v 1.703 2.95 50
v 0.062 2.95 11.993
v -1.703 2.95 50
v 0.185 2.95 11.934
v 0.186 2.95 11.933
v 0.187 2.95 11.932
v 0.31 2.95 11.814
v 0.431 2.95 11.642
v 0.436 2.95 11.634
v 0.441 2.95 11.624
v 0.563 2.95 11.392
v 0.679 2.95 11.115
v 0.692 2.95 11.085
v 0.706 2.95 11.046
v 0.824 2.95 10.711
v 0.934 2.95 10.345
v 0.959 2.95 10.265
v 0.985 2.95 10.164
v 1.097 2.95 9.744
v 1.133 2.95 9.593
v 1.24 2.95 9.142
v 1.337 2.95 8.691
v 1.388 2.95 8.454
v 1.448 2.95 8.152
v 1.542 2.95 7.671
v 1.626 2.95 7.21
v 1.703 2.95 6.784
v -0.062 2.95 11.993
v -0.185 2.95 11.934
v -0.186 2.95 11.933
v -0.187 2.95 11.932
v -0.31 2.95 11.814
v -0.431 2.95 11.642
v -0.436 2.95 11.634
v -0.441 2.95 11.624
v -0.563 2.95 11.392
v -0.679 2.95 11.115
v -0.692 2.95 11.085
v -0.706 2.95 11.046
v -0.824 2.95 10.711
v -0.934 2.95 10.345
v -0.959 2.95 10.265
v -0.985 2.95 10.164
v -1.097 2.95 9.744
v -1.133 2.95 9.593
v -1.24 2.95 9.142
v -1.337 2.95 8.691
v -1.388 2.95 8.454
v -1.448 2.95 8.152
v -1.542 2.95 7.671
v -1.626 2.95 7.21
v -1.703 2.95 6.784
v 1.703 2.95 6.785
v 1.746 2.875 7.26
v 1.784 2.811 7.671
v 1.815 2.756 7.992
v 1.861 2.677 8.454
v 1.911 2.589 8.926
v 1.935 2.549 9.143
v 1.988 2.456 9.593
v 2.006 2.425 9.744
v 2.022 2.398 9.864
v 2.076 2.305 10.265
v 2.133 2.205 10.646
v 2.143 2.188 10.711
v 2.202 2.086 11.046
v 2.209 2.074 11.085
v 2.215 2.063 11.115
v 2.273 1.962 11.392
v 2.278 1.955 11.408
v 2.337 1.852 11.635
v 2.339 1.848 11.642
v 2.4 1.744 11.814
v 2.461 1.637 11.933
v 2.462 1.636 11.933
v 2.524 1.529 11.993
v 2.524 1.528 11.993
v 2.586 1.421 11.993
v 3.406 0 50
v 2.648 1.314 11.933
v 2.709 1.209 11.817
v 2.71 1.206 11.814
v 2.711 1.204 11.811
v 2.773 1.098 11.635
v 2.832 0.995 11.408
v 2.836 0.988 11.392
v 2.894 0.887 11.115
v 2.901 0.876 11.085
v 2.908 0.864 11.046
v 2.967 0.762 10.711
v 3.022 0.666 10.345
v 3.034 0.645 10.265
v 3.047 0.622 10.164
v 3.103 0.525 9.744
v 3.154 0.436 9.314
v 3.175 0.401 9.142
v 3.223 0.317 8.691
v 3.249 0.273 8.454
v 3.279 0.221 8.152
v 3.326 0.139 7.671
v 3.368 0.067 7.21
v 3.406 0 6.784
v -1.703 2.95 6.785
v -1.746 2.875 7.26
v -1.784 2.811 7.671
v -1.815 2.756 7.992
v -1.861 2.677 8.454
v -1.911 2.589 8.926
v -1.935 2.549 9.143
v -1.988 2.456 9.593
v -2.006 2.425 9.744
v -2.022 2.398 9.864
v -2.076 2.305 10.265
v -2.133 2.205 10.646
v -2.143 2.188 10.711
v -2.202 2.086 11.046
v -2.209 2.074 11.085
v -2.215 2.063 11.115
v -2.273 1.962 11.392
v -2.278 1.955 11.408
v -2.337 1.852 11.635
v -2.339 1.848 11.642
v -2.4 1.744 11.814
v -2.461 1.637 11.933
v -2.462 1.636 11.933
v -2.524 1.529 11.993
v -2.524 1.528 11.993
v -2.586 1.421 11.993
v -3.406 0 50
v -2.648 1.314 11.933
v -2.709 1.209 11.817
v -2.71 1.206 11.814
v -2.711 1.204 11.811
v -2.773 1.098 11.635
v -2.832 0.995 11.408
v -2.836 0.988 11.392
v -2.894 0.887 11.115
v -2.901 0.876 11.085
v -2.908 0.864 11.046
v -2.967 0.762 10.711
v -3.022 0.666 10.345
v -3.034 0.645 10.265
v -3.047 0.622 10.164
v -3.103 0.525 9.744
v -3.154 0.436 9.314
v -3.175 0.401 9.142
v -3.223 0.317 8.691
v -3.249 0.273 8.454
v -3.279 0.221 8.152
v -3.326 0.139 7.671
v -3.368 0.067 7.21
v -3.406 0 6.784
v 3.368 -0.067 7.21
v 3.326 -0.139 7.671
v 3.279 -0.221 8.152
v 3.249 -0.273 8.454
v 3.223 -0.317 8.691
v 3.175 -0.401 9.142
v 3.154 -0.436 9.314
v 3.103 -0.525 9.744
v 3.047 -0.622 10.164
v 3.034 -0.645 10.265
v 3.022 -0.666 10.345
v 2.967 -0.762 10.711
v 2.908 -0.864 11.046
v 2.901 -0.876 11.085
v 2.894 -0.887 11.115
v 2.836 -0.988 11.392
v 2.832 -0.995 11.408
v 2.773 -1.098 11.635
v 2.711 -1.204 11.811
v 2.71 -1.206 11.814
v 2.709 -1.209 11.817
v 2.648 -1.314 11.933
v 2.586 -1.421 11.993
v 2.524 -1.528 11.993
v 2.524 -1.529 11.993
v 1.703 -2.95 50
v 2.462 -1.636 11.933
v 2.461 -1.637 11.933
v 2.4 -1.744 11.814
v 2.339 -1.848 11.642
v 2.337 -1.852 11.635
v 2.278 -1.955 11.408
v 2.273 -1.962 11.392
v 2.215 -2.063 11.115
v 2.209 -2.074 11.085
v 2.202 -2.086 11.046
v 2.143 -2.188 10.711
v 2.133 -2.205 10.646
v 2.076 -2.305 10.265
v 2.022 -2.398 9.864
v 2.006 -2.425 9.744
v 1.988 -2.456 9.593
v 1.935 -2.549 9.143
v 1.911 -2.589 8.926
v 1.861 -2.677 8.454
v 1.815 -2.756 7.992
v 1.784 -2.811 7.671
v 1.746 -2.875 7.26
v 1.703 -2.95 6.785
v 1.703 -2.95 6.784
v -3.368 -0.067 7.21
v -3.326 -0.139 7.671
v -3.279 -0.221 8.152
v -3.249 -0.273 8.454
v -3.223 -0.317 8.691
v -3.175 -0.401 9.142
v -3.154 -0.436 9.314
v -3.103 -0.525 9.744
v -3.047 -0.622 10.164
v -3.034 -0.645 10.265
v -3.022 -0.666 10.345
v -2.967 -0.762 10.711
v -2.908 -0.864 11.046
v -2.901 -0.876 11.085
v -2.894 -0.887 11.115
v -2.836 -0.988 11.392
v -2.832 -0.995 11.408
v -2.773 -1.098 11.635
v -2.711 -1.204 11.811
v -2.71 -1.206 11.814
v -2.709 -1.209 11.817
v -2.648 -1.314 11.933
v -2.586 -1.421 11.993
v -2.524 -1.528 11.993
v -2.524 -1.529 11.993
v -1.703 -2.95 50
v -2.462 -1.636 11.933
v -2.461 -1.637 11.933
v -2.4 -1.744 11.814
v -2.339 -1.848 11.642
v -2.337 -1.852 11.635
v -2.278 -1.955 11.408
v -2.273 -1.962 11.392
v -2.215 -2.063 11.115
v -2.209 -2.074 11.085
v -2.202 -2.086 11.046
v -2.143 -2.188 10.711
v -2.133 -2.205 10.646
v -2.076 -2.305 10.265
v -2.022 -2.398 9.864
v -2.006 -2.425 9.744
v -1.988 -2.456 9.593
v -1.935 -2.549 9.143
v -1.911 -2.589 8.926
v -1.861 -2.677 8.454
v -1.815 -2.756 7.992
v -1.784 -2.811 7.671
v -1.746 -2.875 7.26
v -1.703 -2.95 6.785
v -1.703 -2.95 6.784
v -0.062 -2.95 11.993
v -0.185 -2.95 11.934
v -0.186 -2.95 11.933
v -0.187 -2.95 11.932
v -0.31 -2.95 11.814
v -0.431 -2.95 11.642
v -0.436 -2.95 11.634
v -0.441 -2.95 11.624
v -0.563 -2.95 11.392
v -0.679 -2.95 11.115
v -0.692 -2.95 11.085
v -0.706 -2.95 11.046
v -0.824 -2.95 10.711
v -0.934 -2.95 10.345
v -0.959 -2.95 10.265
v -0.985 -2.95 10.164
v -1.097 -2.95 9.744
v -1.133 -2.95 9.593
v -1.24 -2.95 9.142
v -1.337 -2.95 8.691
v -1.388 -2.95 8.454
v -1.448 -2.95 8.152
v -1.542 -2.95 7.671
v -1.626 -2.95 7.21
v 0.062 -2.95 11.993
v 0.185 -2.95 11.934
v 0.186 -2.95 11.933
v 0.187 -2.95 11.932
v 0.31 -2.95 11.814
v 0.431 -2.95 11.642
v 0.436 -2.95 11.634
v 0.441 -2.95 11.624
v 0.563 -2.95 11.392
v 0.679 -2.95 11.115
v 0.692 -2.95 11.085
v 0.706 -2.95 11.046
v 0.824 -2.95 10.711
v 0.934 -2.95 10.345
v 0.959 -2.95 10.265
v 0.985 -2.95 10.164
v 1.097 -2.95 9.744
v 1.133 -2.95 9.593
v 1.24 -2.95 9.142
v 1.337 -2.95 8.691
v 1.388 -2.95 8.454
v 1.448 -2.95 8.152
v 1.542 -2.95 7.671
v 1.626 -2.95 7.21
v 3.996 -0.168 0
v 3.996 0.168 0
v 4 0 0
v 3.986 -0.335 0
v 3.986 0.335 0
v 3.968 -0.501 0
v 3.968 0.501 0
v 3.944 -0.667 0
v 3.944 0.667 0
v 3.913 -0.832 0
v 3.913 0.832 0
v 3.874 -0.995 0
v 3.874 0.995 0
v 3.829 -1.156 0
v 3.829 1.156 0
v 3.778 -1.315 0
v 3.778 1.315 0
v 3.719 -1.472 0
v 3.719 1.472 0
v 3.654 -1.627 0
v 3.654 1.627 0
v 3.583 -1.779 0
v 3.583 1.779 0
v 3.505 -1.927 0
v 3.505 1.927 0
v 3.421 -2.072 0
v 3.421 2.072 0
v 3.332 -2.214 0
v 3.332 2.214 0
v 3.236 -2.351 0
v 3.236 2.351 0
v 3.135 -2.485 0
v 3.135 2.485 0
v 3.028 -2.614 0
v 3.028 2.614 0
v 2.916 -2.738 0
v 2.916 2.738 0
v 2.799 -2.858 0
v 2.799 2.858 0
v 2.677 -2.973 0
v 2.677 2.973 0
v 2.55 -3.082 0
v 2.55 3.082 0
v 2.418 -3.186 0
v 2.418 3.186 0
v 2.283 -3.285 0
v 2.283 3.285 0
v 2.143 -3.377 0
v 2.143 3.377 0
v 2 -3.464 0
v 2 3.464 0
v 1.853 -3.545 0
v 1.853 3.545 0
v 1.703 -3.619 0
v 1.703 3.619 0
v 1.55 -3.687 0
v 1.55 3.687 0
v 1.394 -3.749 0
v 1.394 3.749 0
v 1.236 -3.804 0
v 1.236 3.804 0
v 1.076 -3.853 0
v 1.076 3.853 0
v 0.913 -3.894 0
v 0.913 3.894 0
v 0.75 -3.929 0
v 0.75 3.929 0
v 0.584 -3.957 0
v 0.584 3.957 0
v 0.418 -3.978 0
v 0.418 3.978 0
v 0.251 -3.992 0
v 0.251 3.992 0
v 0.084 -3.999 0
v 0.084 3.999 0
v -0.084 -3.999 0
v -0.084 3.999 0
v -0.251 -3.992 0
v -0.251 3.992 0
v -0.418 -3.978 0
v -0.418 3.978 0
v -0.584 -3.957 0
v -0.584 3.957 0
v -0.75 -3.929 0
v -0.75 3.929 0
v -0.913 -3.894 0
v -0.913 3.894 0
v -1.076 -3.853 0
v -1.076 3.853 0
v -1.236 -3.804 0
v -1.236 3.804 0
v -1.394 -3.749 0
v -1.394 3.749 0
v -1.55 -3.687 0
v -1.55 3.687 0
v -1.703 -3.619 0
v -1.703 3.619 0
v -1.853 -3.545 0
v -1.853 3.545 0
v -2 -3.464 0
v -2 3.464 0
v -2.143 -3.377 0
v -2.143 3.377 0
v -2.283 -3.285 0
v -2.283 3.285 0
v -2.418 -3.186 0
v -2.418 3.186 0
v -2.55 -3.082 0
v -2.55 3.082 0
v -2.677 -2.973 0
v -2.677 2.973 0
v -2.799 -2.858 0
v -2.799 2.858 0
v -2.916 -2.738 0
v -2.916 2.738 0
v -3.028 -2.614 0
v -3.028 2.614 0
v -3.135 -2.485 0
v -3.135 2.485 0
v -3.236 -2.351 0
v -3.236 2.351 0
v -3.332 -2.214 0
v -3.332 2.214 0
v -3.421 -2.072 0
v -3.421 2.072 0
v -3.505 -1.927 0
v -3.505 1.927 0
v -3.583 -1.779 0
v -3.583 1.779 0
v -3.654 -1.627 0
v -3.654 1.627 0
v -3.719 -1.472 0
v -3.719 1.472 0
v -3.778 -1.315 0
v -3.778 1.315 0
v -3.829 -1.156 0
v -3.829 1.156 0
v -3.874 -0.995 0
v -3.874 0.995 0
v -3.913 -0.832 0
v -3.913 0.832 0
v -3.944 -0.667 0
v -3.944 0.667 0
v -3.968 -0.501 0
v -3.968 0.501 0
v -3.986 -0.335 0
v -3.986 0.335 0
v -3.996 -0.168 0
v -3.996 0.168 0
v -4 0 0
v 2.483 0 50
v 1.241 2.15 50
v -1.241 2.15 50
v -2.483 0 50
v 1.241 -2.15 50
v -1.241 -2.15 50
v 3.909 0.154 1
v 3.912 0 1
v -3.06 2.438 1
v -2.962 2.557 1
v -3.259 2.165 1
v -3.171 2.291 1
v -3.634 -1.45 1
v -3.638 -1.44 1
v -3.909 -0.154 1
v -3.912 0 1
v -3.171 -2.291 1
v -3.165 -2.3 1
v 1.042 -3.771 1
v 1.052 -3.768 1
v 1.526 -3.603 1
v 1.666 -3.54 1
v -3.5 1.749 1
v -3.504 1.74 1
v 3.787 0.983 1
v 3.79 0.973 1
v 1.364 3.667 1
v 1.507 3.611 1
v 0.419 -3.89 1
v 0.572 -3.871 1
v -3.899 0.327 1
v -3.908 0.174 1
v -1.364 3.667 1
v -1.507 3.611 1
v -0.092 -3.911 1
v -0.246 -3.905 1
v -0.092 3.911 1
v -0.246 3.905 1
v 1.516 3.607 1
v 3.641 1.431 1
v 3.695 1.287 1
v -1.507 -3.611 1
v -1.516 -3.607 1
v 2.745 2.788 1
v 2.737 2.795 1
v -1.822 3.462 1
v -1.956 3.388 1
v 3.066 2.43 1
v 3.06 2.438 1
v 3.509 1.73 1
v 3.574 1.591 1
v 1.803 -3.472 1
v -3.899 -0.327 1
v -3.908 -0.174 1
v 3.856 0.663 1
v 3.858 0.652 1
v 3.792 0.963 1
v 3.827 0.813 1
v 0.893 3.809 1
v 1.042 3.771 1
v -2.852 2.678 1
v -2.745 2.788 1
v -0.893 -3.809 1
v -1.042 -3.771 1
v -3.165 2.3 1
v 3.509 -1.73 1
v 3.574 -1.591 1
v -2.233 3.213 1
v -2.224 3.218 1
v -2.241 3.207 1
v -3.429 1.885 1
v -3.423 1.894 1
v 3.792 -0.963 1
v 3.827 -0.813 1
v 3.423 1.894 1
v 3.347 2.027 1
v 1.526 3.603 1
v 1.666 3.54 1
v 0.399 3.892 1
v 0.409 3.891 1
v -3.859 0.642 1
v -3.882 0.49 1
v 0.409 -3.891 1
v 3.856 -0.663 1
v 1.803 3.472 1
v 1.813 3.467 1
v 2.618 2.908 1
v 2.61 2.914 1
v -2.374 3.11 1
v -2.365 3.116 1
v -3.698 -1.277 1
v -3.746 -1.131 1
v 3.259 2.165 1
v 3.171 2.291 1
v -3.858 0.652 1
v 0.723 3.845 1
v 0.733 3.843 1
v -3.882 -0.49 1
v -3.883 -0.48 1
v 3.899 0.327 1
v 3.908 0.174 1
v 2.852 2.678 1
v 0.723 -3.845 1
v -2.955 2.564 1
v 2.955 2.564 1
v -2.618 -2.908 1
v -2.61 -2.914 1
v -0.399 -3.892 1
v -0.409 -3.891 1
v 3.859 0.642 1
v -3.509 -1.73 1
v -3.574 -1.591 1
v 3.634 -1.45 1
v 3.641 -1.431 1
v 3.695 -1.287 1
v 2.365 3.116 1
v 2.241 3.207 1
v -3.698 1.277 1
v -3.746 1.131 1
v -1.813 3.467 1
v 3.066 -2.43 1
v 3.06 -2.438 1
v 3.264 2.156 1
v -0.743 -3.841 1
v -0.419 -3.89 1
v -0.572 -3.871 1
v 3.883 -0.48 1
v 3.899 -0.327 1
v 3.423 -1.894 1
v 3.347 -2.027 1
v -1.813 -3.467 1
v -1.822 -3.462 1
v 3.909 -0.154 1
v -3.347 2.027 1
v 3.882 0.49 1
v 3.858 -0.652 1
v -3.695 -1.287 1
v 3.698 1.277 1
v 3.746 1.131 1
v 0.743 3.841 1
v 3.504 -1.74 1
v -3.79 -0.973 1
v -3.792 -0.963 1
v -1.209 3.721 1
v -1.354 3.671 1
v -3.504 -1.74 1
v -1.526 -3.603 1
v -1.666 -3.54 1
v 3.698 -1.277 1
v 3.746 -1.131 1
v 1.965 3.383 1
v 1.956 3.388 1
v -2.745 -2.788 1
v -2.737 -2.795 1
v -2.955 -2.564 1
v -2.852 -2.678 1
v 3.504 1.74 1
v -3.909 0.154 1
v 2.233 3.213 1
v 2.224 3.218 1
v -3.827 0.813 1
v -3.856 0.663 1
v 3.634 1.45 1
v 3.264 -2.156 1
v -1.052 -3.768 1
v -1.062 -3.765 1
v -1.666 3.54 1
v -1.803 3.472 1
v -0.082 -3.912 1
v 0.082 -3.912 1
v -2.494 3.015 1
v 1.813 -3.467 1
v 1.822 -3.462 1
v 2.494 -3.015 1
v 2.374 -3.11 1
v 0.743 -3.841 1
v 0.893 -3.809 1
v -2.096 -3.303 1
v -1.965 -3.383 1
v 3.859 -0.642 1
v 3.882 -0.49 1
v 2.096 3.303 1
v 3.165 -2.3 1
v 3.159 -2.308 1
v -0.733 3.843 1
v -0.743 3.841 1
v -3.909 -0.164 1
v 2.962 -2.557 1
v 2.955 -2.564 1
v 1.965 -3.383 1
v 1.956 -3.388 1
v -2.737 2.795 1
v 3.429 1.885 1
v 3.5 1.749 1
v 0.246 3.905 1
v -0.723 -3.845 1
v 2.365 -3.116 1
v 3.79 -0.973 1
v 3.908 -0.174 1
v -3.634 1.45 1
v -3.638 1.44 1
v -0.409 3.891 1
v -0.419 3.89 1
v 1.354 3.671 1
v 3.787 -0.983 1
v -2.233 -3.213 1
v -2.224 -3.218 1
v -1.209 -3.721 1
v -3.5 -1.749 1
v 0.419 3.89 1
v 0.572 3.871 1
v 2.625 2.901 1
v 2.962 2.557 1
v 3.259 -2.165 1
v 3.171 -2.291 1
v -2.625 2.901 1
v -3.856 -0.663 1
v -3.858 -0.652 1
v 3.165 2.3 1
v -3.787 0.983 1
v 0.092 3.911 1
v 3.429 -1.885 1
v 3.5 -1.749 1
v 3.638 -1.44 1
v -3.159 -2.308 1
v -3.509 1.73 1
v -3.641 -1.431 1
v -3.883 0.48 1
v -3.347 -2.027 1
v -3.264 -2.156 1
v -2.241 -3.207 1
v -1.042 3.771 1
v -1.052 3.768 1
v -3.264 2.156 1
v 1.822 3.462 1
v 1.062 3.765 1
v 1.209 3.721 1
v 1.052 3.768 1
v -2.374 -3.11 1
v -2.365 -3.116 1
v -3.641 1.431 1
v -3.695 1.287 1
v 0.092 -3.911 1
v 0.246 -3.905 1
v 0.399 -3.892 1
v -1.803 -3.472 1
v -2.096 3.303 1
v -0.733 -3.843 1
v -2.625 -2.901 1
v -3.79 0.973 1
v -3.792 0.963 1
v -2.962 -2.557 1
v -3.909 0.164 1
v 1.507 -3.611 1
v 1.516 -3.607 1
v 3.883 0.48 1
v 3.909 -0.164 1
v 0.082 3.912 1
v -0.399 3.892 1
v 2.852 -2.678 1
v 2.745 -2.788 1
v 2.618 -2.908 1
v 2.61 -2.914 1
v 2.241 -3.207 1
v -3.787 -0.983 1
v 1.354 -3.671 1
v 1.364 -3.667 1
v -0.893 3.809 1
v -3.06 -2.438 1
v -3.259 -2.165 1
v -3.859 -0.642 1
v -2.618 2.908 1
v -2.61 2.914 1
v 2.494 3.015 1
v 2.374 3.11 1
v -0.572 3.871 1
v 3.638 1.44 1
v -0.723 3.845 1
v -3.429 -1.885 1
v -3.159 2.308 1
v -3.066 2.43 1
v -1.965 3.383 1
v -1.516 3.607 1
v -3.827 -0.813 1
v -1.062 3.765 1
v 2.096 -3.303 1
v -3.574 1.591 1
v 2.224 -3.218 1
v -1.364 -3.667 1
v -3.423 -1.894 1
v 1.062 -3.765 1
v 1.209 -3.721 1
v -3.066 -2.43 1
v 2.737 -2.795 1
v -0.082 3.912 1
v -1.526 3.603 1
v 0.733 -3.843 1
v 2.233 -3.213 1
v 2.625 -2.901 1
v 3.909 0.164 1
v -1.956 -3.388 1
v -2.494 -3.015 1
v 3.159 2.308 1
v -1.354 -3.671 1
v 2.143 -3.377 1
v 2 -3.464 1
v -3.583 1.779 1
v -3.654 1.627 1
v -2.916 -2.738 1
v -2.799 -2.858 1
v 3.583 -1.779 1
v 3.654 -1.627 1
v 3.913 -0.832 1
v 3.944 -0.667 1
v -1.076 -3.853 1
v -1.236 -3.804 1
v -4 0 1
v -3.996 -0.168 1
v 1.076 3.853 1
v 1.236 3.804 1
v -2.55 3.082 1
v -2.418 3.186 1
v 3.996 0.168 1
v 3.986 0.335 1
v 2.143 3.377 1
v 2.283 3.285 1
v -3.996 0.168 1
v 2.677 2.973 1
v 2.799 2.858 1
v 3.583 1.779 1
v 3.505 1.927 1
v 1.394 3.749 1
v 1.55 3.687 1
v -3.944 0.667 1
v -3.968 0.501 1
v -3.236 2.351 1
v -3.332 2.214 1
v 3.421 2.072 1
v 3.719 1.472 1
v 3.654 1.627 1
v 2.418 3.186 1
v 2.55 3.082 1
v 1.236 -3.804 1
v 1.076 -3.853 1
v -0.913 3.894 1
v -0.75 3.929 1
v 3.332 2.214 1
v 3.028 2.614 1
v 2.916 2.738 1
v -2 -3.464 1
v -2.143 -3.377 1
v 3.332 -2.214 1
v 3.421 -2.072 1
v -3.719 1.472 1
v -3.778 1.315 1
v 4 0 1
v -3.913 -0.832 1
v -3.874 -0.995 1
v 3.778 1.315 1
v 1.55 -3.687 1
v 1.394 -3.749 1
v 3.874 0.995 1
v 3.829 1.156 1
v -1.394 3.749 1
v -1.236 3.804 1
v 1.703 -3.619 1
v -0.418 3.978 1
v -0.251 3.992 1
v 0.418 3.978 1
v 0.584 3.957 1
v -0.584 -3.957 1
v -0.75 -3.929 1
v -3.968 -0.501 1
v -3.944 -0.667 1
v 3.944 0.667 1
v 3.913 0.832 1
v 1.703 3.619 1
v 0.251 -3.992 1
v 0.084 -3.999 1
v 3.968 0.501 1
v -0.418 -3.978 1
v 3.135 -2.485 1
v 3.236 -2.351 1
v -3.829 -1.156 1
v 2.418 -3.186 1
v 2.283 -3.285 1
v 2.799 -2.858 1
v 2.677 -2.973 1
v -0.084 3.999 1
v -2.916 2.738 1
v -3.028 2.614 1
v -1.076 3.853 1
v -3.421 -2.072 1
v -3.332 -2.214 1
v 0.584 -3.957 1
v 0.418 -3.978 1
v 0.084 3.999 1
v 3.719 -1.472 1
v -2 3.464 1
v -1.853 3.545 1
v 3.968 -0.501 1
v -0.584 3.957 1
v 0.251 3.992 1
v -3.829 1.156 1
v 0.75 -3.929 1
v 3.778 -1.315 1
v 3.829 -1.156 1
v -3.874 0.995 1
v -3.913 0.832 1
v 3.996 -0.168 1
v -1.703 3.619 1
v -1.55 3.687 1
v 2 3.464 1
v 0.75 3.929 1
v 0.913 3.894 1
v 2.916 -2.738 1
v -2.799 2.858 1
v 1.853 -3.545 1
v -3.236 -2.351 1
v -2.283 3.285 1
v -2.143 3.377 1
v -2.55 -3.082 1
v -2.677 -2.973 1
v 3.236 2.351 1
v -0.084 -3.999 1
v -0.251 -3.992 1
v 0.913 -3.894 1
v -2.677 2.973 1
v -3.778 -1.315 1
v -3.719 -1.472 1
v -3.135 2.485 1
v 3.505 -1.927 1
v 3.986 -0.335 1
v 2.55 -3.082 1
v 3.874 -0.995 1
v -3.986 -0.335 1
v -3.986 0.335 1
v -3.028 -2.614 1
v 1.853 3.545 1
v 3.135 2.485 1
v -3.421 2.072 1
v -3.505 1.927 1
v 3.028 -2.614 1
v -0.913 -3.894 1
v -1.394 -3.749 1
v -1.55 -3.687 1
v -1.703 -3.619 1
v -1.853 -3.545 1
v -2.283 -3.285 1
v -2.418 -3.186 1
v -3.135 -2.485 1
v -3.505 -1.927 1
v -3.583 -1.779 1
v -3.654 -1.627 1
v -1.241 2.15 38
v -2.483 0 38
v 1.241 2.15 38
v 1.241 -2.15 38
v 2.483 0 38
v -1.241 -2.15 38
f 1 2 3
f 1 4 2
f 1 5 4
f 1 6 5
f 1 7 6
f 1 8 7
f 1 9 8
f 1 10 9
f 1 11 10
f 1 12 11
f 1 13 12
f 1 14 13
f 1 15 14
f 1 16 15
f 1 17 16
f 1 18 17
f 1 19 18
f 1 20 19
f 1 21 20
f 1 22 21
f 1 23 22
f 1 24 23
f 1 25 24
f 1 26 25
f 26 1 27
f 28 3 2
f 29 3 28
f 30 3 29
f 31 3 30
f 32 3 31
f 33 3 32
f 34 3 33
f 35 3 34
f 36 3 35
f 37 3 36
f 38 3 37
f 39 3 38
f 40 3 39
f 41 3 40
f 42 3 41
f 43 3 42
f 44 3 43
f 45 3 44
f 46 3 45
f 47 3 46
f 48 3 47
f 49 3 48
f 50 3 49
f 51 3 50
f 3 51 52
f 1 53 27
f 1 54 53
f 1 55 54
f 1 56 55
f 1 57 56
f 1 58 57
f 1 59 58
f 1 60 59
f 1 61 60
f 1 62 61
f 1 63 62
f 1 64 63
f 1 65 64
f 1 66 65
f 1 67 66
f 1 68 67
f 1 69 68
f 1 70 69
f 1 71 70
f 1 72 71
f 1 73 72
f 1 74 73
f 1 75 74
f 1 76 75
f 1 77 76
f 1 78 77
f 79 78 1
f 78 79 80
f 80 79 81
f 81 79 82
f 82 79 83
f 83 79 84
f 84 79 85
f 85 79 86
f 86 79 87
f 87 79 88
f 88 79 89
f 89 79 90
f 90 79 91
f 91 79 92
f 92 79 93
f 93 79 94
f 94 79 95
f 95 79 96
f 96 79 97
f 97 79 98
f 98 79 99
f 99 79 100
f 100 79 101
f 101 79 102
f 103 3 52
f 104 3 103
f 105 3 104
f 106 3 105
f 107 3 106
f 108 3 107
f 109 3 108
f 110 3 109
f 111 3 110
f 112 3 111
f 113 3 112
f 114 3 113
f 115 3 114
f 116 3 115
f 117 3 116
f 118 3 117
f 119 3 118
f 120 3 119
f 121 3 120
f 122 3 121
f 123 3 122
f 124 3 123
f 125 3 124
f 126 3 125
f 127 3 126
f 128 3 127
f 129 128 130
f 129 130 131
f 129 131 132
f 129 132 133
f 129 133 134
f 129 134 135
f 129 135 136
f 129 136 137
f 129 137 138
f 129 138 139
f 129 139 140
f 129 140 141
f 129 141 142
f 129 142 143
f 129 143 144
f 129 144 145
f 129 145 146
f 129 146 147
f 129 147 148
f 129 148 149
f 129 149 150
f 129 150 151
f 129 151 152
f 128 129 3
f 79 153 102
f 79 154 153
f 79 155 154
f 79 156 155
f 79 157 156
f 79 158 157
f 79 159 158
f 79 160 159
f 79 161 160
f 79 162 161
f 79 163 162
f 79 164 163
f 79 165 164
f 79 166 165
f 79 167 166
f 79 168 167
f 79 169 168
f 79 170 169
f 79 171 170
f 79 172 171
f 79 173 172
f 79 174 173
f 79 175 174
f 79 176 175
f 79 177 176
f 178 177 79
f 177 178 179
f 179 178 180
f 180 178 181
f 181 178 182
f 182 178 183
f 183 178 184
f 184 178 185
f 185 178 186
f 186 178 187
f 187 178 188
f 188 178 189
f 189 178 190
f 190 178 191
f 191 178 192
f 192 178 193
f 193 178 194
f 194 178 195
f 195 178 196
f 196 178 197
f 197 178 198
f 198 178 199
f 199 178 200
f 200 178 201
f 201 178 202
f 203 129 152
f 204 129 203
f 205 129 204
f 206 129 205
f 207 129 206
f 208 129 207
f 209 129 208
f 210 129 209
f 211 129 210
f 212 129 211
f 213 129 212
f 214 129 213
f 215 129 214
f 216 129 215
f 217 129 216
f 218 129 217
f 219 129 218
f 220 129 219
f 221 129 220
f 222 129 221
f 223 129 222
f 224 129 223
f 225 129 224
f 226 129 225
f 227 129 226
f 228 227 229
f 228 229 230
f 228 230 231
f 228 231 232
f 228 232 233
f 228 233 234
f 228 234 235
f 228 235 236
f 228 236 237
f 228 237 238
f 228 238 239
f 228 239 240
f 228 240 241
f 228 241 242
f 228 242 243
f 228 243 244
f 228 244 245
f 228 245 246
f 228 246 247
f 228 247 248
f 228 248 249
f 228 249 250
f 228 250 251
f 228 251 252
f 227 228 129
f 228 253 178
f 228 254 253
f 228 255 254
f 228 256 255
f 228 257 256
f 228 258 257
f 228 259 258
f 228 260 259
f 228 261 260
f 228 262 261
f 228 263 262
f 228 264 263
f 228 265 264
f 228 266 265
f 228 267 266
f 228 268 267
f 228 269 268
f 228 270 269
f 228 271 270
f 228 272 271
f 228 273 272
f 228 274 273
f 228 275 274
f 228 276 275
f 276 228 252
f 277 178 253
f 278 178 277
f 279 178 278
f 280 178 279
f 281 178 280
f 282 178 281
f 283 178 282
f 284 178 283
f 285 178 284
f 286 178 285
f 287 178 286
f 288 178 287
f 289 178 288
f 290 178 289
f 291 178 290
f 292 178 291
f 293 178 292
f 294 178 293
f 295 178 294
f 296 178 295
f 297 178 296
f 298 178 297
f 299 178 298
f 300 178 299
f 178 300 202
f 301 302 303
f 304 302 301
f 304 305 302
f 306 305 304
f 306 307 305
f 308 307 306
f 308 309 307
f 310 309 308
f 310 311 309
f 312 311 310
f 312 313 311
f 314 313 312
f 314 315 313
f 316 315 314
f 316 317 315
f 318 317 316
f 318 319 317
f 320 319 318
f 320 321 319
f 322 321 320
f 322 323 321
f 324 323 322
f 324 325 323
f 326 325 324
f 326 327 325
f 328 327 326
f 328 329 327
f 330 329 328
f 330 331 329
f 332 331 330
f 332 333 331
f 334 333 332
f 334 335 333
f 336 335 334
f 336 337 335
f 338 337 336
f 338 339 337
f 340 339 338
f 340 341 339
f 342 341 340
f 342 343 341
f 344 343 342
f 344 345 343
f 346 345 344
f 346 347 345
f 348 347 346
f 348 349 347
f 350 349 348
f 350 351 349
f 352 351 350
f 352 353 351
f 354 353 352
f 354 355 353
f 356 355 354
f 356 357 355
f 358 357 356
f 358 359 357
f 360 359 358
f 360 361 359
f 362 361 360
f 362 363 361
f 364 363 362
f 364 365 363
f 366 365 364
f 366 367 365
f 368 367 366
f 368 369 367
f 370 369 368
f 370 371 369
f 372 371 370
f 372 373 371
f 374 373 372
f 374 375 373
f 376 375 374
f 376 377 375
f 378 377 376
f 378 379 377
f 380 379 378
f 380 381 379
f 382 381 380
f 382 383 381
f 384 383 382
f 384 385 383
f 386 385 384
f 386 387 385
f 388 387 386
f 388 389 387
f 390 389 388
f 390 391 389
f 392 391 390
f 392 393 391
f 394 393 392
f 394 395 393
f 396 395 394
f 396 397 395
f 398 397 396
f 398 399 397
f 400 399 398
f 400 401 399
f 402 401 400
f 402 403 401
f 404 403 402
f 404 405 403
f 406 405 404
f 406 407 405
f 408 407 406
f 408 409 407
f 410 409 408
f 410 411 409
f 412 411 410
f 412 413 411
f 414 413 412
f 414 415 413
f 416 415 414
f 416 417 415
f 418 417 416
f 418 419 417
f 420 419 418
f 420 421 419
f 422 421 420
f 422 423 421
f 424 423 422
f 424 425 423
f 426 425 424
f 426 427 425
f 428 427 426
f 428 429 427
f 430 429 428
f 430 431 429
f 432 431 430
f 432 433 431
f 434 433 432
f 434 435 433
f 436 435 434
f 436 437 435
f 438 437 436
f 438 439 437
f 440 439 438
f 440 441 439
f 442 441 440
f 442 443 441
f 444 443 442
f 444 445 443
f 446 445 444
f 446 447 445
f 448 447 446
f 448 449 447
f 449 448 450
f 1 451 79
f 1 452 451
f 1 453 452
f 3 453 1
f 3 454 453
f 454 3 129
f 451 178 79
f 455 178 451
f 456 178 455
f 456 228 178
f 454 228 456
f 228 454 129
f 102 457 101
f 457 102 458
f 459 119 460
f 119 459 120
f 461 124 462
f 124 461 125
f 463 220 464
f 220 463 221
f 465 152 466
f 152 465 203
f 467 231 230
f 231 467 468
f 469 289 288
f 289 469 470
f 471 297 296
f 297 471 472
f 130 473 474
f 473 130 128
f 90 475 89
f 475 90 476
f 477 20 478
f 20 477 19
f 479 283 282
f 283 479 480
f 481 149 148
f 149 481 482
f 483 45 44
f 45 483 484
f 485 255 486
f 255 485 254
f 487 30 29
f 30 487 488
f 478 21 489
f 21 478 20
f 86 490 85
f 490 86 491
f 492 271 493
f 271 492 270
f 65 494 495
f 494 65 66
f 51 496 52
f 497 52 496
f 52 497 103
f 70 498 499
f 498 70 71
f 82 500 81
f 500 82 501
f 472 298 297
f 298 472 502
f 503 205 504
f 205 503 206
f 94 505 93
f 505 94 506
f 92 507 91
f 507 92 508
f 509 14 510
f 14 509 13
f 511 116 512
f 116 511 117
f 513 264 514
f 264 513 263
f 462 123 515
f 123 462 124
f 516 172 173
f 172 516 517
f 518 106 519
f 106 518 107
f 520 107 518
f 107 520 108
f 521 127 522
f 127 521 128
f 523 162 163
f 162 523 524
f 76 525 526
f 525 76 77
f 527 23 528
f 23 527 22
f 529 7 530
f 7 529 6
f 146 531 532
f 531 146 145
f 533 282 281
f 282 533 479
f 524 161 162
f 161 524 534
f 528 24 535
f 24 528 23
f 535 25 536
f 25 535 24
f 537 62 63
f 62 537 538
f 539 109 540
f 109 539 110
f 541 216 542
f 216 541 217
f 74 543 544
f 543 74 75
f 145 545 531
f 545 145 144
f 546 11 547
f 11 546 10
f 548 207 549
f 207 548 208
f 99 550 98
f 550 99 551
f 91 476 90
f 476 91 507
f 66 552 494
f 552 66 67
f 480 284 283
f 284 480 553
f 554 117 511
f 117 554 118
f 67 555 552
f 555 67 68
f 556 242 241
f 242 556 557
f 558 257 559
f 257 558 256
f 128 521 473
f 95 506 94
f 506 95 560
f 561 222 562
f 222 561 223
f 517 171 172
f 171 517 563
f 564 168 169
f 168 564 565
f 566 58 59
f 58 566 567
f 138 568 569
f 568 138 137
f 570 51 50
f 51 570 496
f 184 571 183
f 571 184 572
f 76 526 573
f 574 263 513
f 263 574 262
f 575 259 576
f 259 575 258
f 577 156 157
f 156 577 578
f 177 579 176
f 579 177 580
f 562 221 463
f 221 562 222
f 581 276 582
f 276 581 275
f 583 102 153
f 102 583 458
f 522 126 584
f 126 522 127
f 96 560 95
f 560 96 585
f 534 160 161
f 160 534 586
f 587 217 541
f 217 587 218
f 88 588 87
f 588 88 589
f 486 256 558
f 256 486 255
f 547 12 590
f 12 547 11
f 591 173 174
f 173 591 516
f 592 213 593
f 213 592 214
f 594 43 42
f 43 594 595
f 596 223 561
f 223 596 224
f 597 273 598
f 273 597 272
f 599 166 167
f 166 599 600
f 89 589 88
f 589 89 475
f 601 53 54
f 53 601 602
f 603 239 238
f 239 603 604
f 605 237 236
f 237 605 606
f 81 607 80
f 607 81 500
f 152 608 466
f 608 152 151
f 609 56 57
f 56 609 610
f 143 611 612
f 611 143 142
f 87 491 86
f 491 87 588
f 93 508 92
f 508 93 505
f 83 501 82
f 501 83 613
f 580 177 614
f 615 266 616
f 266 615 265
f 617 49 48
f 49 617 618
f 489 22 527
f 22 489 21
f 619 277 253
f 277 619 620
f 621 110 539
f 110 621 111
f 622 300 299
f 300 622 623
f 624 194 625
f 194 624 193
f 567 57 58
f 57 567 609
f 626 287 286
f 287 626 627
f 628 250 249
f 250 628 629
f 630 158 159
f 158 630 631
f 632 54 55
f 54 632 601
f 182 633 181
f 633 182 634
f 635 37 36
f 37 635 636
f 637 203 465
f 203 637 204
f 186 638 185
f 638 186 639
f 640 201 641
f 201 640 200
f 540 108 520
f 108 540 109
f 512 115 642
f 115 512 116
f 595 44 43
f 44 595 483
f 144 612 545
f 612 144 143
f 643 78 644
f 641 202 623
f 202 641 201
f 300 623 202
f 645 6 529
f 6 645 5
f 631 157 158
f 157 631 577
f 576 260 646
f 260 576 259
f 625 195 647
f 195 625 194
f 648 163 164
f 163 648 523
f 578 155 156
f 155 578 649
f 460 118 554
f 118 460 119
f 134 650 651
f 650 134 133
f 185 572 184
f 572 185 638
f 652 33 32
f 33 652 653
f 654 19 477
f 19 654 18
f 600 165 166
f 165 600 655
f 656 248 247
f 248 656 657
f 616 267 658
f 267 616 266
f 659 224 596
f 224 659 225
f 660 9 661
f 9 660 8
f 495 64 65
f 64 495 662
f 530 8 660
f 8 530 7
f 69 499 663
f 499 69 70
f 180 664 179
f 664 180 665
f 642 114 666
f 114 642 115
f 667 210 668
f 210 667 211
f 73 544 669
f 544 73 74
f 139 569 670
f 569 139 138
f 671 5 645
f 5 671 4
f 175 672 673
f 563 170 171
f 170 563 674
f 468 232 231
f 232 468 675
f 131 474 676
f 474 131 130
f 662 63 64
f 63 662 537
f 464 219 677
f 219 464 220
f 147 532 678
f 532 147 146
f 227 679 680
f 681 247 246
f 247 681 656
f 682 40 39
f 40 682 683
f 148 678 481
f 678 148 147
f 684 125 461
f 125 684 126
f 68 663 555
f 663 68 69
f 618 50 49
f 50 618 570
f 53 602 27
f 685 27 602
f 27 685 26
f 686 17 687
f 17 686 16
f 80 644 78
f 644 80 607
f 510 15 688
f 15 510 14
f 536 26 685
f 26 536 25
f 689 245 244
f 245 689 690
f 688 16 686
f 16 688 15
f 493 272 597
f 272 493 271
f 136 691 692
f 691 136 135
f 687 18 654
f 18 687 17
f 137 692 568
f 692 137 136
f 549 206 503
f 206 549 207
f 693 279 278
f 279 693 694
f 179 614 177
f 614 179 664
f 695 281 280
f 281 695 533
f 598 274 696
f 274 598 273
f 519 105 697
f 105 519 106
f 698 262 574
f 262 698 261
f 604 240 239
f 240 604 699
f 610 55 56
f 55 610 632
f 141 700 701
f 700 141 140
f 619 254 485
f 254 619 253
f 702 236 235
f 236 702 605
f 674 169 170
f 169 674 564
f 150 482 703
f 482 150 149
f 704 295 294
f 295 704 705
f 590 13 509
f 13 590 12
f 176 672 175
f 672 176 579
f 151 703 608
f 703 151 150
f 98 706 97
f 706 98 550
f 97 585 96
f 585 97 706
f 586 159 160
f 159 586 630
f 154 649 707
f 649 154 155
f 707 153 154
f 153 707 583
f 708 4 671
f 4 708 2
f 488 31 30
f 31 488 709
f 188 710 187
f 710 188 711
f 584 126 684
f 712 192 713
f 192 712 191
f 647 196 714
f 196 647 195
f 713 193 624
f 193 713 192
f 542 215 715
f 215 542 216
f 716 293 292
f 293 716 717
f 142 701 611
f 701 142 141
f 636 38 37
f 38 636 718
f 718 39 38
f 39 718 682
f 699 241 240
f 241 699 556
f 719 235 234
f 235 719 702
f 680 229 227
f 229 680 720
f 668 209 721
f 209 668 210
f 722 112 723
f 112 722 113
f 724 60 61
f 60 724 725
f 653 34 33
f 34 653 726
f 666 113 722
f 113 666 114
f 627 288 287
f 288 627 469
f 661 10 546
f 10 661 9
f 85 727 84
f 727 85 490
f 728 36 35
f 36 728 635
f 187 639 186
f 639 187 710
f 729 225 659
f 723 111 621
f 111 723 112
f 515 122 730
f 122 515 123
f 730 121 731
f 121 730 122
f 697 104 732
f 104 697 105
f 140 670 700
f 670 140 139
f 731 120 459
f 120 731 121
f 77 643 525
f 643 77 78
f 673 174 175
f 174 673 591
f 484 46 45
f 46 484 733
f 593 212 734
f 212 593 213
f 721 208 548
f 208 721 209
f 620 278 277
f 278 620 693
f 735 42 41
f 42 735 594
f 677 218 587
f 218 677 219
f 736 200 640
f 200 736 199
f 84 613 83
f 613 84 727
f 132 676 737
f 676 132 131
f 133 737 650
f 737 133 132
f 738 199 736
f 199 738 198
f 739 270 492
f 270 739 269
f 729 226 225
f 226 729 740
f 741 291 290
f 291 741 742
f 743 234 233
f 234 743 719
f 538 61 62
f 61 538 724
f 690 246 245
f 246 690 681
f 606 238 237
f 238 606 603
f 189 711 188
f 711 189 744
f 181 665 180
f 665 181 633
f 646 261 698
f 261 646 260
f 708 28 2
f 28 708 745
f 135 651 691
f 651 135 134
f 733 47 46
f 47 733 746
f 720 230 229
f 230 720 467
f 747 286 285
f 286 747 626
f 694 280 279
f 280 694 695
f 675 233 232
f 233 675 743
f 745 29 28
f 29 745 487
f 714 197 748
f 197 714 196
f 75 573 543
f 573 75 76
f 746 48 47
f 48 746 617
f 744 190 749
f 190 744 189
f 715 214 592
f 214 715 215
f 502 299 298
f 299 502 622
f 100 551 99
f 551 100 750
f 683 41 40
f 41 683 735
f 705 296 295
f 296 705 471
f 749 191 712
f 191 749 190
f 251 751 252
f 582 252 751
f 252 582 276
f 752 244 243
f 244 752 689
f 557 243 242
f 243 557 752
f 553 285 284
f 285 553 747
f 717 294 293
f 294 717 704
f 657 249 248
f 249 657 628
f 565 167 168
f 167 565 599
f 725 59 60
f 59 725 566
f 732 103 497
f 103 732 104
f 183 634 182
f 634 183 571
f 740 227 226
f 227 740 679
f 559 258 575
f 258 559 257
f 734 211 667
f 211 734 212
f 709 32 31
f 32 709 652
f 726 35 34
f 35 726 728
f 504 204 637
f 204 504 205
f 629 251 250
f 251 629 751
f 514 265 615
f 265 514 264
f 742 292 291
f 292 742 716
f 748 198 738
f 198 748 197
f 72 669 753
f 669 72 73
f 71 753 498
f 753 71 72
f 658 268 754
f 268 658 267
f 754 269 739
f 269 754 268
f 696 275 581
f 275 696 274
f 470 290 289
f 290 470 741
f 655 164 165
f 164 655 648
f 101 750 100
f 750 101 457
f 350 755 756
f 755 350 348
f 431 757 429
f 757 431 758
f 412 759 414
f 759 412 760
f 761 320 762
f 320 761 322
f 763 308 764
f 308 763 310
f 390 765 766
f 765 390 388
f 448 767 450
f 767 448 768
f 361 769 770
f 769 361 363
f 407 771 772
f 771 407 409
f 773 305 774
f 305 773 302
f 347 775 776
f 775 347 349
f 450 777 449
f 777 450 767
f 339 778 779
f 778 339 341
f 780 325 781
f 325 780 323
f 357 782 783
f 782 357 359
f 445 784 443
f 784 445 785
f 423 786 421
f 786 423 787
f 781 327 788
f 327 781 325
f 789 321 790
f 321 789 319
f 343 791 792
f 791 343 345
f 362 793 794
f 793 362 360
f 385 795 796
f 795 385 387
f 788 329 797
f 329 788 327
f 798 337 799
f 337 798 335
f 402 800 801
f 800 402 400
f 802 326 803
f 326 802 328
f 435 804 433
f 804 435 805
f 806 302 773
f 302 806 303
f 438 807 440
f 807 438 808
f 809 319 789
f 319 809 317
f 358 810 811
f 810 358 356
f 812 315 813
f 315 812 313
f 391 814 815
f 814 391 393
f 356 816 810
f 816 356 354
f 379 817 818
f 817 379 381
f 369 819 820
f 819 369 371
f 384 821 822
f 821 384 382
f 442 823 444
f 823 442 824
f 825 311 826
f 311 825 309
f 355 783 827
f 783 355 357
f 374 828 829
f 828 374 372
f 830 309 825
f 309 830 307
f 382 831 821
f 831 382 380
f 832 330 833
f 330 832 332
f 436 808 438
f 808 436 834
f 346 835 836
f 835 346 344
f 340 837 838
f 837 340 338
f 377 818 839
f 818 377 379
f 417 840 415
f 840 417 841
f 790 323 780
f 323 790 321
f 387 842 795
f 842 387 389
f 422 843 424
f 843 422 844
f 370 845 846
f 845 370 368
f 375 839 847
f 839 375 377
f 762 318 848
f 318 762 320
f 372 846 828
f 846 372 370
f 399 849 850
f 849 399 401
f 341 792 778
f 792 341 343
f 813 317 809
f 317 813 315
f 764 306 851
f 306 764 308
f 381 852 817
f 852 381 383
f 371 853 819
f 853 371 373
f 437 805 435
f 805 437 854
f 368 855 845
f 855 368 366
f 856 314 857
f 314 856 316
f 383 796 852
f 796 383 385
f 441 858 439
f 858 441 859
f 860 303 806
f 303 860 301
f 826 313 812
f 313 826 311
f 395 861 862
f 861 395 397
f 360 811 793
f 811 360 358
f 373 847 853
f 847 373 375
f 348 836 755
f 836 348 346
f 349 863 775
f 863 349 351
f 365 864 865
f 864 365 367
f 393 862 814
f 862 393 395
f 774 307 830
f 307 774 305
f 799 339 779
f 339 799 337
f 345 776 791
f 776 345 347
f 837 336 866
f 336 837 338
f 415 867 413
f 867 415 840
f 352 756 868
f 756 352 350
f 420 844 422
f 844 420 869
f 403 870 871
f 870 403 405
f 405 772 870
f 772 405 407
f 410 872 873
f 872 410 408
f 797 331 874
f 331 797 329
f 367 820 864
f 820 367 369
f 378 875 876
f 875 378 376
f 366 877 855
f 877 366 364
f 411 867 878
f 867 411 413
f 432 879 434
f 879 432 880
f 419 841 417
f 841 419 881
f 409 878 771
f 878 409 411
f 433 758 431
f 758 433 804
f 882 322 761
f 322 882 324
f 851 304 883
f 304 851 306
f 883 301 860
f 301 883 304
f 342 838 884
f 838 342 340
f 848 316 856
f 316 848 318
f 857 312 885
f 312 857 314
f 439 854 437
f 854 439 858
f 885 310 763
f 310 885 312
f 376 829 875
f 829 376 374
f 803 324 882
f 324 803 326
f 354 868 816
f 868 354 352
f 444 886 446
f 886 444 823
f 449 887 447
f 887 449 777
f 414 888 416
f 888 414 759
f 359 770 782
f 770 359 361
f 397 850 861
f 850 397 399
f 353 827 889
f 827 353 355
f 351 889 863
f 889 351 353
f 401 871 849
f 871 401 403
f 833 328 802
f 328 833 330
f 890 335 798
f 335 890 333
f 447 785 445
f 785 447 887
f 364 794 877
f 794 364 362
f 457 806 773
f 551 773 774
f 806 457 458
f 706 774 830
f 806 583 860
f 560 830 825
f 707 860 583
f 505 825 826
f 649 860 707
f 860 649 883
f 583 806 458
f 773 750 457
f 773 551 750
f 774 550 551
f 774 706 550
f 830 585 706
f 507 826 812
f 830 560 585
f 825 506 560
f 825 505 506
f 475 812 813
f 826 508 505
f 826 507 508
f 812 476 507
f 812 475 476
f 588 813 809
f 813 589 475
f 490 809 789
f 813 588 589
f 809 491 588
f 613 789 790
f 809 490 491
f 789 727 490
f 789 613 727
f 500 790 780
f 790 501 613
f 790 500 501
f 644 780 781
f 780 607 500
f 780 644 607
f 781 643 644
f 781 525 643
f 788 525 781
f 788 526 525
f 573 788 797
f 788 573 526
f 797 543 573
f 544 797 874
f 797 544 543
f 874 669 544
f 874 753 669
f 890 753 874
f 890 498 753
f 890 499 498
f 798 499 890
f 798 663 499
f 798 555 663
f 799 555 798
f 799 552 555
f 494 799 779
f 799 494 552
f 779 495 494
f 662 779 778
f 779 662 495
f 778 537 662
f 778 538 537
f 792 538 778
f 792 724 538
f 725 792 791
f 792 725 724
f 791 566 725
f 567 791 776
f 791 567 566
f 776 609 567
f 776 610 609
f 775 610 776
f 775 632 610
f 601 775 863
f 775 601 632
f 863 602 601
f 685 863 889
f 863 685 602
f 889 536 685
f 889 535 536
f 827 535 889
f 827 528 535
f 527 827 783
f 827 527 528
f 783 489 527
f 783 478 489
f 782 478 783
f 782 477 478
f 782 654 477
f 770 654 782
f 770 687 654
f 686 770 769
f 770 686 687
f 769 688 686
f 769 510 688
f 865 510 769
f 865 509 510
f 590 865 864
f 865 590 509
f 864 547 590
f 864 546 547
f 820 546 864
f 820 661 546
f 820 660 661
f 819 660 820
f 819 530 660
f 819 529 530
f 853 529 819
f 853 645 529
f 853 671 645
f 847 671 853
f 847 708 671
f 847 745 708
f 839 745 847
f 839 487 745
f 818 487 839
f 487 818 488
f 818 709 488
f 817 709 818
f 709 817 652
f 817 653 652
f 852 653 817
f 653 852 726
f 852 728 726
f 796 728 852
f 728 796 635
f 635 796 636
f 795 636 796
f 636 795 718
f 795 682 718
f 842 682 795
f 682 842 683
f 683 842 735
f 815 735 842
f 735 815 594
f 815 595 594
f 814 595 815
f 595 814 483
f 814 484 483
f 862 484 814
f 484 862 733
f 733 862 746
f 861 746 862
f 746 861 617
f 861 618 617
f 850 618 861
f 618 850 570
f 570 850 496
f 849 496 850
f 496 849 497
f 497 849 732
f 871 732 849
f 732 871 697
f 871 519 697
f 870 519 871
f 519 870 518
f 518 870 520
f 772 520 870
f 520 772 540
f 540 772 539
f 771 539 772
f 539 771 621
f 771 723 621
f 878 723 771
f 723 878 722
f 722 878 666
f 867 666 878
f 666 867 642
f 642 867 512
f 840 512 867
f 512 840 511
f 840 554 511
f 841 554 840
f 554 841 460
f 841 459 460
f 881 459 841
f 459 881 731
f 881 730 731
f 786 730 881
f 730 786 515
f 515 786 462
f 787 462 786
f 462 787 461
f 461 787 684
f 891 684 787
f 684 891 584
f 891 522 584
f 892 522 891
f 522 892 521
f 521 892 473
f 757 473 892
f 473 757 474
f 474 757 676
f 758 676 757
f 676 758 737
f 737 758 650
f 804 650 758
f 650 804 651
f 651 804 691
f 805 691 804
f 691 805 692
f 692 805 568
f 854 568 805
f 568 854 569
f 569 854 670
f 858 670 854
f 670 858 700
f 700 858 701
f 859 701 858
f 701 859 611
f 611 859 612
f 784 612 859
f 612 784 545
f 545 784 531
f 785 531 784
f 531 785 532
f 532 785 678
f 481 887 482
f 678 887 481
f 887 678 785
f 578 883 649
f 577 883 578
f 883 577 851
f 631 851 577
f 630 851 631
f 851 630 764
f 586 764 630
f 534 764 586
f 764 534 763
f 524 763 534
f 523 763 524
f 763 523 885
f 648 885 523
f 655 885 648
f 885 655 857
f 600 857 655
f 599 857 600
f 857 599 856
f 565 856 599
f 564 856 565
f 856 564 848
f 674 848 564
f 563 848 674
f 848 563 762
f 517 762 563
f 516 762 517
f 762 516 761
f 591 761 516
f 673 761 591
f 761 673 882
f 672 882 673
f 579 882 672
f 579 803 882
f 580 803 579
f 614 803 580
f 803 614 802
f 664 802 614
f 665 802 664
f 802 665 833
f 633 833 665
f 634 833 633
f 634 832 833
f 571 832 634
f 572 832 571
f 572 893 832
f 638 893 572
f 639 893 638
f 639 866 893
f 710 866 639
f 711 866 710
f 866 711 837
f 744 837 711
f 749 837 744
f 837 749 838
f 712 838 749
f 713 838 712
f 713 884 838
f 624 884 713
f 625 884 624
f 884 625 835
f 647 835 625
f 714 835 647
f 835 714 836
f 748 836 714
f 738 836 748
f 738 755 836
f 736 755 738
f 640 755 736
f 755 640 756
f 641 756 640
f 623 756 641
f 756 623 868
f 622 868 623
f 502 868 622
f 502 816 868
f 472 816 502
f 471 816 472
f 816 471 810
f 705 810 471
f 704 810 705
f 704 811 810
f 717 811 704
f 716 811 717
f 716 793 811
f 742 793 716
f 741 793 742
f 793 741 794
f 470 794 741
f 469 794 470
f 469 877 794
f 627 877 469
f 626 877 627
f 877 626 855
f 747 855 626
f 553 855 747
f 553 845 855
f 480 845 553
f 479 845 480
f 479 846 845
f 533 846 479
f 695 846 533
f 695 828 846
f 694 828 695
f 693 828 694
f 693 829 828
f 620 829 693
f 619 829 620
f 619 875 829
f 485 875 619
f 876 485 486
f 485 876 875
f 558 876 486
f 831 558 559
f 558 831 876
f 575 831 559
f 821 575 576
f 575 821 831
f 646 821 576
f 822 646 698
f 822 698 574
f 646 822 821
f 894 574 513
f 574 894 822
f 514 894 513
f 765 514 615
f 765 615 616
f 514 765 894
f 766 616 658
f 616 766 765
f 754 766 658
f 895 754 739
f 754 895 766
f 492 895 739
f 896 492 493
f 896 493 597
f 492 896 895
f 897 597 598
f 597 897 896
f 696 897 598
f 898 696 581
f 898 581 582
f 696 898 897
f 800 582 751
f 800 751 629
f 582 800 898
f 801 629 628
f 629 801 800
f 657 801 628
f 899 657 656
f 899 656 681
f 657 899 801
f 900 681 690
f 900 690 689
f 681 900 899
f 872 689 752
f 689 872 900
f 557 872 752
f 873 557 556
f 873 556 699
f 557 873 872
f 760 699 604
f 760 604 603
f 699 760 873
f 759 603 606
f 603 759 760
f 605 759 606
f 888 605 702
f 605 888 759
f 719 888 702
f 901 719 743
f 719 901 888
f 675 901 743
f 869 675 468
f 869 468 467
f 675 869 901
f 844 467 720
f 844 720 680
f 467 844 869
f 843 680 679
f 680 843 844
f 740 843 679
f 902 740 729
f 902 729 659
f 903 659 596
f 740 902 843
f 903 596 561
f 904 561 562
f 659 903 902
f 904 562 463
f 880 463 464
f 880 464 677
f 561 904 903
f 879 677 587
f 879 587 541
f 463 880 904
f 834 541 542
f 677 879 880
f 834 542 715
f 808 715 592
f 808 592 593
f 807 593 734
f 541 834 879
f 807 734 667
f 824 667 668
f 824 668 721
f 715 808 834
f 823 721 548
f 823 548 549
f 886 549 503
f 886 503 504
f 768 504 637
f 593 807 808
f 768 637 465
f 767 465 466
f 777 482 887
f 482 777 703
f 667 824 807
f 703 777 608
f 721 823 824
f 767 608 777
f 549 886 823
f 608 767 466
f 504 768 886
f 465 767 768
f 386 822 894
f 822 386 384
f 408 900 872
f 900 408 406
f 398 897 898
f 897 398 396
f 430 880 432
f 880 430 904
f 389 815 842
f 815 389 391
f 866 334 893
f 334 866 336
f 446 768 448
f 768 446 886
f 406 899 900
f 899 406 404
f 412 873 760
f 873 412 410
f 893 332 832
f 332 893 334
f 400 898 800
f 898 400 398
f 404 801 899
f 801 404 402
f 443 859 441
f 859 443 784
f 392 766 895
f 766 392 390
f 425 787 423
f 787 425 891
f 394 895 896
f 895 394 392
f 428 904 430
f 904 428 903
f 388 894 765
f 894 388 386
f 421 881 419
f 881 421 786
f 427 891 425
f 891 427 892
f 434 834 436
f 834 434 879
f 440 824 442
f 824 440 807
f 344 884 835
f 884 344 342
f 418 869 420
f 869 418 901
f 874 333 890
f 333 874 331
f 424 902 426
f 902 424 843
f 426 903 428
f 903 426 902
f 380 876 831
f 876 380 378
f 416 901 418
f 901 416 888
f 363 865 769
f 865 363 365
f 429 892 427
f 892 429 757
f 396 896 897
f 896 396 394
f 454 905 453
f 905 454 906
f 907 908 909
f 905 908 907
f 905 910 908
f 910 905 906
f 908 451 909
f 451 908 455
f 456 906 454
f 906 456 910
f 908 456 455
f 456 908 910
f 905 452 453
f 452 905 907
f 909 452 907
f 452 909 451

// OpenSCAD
// Allen key/hex key extender
// version 0.0.1
// by pixelhaufen
// is licensed under CC BY-SA 3.0 -> https://creativecommons.org/licenses/by-sa/3.0/

//------------------------------------------------------------------
// User Inputs


/*[propertys]*/
// inner diameter of the key
inner_diameter = 4.3; // [1:0.1:10]

// height of the extender
height = 50; // [10:1:80]

// depth of the hole for the bit
depth = 12; // [8:1:20]

// use a multiple of your nozzle
shell = 0.8; // [0.1:0.05:5]

// diameter of the base
base_diameter = 8; // [8:1:20]


/*[Hidden]*/
$fn = 150; // stell can't be modified on thingiverse
incircle = inner_diameter/2;
base_radius = base_diameter/2;


//------------------------------------------------------------------
// Main

difference()
{
    union()
    {
        hexagon(incircle+shell,height);
        cylinder(r1=base_radius, r2=incircle+shell, h=depth, center=false);
        cylinder(r1=base_radius, r2=base_radius, h=1, center=false);
    }
    
    translate([0,0,height-depth])
    {
        hexagon(incircle,depth);
    }
}


//------------------------------------------------------------------
// Module

module hexagon(incircle, height)
{
    r=incircle/(sqrt(3)/2);
    linear_extrude(height = height, center = false, convexity = 10, twist = 0)
    {
        angles=[ for (i = [0:6-1]) i*(360/6) ];
        coords=[ for (th=angles) [r*cos(th), r*sin(th)] ];
        polygon(coords);
    }
 }
 
